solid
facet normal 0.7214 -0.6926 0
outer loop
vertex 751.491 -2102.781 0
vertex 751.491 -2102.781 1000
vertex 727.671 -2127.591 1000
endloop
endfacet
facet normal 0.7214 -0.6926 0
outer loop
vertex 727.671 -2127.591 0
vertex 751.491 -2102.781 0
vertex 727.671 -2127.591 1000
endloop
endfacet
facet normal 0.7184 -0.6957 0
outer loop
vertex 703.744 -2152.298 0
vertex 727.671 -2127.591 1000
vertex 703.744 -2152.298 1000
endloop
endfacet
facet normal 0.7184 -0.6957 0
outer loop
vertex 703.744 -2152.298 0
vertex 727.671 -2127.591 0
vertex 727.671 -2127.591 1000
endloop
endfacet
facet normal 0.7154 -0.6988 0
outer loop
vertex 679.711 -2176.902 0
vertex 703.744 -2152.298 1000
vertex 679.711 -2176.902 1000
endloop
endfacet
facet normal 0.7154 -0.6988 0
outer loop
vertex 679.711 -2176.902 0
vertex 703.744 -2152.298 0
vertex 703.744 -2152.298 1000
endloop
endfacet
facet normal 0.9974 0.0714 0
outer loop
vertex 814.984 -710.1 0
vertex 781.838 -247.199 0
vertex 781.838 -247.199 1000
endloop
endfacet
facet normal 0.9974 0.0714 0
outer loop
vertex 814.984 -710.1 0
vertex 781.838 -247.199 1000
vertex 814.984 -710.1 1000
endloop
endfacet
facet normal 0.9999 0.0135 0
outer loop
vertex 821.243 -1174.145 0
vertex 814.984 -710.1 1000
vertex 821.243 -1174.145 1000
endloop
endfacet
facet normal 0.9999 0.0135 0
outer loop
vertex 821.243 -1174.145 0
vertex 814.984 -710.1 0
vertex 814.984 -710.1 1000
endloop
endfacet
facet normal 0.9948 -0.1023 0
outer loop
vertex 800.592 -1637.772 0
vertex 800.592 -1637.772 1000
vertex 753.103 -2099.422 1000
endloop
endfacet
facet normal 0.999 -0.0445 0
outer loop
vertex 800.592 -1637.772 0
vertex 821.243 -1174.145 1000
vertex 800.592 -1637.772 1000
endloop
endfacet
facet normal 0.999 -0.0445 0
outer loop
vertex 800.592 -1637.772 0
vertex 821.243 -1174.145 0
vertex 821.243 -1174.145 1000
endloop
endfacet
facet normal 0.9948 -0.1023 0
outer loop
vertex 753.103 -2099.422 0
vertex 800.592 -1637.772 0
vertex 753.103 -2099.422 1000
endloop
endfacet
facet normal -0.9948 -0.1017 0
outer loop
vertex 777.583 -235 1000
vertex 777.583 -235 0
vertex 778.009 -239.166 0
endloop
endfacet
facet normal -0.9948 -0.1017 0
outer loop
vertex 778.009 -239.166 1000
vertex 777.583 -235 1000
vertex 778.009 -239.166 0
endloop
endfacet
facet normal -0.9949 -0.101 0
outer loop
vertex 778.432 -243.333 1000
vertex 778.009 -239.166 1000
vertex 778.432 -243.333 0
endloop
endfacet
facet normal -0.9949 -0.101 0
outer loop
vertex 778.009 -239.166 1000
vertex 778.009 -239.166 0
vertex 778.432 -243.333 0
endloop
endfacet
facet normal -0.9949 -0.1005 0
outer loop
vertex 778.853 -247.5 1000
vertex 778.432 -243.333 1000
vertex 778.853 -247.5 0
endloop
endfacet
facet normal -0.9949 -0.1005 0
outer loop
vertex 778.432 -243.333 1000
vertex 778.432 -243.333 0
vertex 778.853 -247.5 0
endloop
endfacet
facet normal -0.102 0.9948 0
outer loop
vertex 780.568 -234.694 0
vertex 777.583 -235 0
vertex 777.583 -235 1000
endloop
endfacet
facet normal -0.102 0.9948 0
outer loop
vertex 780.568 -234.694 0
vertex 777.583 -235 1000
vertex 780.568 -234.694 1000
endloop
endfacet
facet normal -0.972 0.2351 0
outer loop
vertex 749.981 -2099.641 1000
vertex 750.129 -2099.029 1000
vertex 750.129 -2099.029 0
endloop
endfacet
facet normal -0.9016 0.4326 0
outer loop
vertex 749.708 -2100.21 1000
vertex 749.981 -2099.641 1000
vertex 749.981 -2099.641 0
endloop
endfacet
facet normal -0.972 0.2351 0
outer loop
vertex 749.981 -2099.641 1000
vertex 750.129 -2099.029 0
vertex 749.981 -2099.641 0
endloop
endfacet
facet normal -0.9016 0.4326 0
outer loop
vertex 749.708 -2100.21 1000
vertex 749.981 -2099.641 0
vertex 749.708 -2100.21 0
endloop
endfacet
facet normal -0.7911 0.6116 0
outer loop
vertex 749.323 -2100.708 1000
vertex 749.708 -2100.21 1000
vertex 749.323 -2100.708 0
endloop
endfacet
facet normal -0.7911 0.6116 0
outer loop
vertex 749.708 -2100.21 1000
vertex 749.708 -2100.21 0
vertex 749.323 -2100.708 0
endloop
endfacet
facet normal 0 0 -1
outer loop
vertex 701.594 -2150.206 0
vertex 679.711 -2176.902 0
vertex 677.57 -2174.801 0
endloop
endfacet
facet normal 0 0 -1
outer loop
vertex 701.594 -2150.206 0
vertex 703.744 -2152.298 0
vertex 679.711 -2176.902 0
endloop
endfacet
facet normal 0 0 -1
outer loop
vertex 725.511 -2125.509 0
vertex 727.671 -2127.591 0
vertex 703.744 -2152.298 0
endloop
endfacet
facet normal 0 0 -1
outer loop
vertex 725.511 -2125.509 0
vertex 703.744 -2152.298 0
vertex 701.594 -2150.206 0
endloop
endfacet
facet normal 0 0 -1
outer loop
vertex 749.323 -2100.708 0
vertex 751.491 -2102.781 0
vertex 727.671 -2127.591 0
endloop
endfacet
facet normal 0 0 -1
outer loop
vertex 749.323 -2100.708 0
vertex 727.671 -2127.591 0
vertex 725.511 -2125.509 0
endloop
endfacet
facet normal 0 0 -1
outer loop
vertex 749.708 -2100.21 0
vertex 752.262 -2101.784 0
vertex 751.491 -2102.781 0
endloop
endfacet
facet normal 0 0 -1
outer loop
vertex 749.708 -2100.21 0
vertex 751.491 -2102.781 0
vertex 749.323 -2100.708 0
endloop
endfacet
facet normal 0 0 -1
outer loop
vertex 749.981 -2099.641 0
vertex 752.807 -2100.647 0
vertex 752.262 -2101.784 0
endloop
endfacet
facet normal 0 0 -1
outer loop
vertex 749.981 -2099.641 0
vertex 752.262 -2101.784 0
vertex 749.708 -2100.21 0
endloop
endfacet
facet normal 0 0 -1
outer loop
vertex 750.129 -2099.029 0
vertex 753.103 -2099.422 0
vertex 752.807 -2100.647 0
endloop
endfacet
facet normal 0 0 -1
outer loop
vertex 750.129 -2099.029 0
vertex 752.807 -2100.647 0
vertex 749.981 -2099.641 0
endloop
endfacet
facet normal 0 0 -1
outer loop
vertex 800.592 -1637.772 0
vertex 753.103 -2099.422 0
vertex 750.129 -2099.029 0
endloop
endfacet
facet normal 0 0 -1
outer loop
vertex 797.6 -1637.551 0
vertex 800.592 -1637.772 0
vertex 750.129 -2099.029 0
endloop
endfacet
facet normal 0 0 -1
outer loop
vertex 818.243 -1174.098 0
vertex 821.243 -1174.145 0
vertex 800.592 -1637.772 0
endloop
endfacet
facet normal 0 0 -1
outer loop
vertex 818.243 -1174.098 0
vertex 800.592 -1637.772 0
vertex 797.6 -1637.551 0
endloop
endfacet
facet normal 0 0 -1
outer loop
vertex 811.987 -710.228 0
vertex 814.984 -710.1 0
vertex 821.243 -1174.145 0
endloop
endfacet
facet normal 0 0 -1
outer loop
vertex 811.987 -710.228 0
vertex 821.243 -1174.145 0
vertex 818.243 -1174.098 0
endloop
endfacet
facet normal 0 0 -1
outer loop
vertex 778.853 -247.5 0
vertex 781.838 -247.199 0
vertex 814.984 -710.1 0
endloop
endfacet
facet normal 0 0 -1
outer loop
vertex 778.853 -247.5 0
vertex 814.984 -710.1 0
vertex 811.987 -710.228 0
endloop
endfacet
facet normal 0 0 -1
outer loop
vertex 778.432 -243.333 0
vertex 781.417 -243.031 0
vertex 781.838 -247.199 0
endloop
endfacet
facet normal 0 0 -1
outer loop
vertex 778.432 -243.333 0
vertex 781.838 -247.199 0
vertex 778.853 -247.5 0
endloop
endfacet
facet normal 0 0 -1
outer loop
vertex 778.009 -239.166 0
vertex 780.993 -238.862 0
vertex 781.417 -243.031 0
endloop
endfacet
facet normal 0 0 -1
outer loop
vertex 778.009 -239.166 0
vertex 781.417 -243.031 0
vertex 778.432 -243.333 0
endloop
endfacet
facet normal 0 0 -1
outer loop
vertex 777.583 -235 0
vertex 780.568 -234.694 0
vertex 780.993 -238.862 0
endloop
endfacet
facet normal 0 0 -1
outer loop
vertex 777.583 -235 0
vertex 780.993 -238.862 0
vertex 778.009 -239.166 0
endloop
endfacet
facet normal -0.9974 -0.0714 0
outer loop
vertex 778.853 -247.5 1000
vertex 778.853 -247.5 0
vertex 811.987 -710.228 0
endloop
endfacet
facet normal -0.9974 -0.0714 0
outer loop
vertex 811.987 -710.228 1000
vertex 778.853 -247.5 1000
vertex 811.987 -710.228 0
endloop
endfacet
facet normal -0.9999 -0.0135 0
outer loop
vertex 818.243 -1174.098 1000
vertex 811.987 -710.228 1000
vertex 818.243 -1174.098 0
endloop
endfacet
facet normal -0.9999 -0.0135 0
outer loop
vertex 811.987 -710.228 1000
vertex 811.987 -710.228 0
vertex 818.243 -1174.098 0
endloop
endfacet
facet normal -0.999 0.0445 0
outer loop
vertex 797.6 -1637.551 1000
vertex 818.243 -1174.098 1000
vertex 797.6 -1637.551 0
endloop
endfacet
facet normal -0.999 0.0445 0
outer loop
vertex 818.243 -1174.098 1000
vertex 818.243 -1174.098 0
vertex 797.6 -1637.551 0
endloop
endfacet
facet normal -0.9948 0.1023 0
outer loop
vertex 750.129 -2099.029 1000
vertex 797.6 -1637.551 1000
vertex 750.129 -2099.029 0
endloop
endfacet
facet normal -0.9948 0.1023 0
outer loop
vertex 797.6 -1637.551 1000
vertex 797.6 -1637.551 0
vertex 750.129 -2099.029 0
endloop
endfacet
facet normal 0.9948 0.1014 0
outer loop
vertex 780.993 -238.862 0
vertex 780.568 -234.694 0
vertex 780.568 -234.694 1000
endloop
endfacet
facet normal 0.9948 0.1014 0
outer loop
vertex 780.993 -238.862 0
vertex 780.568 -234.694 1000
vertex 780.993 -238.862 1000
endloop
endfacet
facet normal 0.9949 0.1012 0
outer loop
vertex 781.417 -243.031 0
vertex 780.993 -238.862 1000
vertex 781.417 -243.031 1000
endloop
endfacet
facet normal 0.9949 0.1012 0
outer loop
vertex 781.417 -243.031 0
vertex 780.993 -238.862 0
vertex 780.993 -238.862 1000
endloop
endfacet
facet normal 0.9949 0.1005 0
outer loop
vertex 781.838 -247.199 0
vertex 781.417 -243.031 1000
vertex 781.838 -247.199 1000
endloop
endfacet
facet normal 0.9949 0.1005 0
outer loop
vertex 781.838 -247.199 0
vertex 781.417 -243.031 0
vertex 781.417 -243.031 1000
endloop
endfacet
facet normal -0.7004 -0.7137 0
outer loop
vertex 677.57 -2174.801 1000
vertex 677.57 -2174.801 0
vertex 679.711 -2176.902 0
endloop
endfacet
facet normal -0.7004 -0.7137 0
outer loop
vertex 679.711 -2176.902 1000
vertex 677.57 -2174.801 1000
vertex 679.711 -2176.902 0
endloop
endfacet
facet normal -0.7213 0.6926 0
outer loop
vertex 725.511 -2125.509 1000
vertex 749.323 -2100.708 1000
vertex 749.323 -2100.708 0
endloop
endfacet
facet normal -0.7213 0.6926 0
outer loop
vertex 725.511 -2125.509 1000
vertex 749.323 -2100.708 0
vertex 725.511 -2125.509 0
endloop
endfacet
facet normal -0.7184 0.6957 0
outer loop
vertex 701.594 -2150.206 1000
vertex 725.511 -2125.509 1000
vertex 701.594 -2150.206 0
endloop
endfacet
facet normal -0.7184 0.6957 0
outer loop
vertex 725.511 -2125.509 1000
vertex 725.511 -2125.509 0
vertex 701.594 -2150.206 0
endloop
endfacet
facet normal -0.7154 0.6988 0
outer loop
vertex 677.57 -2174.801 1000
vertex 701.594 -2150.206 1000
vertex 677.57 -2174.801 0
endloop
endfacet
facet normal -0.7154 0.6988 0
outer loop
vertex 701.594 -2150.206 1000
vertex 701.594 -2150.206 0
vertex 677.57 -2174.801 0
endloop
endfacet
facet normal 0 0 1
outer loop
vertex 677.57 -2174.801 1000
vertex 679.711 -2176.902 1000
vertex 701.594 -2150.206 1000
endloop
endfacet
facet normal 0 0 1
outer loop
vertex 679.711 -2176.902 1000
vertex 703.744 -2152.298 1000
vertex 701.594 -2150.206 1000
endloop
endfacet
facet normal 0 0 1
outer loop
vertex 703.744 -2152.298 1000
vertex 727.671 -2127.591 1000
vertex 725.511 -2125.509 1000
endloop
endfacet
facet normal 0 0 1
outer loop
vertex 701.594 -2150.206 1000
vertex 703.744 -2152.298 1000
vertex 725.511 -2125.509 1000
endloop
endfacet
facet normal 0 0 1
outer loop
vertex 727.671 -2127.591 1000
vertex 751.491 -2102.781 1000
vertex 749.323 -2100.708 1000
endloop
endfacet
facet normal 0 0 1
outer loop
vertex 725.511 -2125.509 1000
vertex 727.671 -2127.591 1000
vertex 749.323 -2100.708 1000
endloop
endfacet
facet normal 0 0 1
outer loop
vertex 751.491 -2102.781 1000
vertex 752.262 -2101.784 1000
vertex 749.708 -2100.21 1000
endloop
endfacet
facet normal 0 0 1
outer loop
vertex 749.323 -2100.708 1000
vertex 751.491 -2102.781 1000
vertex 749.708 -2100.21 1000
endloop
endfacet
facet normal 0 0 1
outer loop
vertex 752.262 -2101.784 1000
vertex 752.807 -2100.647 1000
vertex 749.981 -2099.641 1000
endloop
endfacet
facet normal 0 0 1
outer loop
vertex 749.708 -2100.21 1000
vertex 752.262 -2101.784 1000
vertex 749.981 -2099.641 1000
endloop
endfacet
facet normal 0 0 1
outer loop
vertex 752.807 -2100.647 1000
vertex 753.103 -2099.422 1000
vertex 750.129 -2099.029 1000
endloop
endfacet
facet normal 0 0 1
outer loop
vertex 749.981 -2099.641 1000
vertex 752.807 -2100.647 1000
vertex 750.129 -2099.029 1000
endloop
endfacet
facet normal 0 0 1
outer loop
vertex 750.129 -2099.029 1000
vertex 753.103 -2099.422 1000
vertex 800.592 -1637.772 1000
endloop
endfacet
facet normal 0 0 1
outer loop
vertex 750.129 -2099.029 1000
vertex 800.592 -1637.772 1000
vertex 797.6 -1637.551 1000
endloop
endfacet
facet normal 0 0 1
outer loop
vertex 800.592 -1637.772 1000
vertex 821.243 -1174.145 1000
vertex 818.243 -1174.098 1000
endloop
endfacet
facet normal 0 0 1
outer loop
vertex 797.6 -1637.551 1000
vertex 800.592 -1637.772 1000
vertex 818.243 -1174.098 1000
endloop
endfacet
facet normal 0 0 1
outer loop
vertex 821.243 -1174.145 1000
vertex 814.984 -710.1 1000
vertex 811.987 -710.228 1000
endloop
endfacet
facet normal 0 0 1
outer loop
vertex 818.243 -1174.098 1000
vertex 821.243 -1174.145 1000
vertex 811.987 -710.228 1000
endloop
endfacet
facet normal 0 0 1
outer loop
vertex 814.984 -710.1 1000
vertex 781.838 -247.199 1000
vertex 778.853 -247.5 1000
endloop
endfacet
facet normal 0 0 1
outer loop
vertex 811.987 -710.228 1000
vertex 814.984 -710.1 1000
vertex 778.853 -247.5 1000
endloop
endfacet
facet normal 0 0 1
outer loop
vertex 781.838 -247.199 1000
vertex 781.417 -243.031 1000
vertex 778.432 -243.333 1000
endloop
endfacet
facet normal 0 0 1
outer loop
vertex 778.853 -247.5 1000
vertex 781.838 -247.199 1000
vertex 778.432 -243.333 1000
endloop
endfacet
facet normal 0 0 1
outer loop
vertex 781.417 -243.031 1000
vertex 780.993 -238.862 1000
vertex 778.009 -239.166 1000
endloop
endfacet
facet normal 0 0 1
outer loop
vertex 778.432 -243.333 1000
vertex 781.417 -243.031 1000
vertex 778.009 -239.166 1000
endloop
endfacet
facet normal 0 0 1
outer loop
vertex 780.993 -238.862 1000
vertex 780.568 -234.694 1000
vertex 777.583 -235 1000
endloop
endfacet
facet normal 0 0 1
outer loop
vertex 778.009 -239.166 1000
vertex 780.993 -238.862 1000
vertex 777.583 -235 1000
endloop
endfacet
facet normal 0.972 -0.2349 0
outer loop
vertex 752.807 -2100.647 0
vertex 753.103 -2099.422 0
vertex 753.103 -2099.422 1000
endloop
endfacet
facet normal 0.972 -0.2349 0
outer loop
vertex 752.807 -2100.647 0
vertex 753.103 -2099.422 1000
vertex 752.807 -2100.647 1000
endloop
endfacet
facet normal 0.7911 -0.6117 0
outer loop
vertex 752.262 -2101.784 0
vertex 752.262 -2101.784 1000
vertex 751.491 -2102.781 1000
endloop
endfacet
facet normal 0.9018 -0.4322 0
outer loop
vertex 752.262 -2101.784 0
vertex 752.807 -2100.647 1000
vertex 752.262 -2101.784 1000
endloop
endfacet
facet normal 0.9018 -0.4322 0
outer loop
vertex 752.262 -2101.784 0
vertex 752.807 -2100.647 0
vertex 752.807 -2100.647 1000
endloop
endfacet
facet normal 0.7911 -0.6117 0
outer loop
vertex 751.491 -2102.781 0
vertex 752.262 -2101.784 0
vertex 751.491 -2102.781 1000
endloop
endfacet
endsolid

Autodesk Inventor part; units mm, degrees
ref_plane "YZ Plane" through (0, 0, 0) normal (1, 0, 0) x (0, 1, 0)
ref_plane "XZ Plane" through (0, 0, 0) normal (0, 1, 0) x (-1, 0, 0)
ref_plane "XY Plane" through (0, 0, 0) normal (0, 0, 1) x (1, 0, 0)
sketch "Sketch1" plane through (0, 0, 0) normal (0, 0, 1) x (1, 0, 0)
  line L0 (-750, 0) -> (750, 0) construction
  line L1 (750, 0) -> (750, -2100) construction
  line L2 (750, -2100) -> (110, -2700) construction
  line L3 (108.907697, -2700) -> (-108.907697, -2700) construction
  line L4 (-110, -2700) -> (-750, -2100) construction
  line L5 (-750, -2100) -> (-750, 0) construction
  arc A0 (745.236855, 0.447083) -> (-745.236855, 0.447083) centre (0, -7964.766161) ccw construction
  arc A1 (-750.626493, -4.742884) -> (-776.293231, -222.5) centre (7180.794412, -1050) ccw construction
  arc A2 (-777.58325, -235) -> (-778.853429, -247.5) centre (7180.794412, -1050) ccw construction
  arc A3 (750.128547, -2099.028611) -> (778.853429, -247.5) centre (-7180.794412, -1050) ccw
  arc A4 (777.58325, -235) -> (776.293231, -222.5) centre (-7180.794412, -1050) ccw construction
  line L6 (-777.58325, -235) -> (777.58325, -235) construction
  arc A5 (-749.322934, -2100.70831) -> (-677.569881, -2174.801078) centre (5033.298449, 3427.518345) ccw construction
  line L7 (-750, -2100) -> (750, -2100) construction
  line L8 (-547.172872, -2035.710935) -> (-801.083389, -2306.54882) construction
  arc A6 (-677.569881, -2174.801078) -> (-110.836747, -2699.297556) centre (5033.298449, 3427.518345) ccw construction
  arc A7 (-745.236855, 0.447083) -> (-750.626493, -4.742884) centre (-744.677927, -5.526826) ccw construction
  arc A8 (750.626493, -4.742884) -> (745.236855, 0.447083) centre (744.677927, -5.526826) ccw construction
  arc A9 (-750.128547, -2099.028611) -> (-749.322934, -2100.70831) centre (-747.154451, -2098.635225) ccw construction
  arc A10 (110.836747, -2699.297556) -> (677.569881, -2174.801078) centre (-5033.298449, 3427.518345) ccw construction
  line L9 (553.81945, -2042.800618) -> (794.436811, -2299.459137) construction
  arc A11 (677.569881, -2174.801078) -> (749.322934, -2100.70831) centre (-5033.298449, 3427.518345) ccw
  arc A12 (749.322934, -2100.70831) -> (750.128547, -2099.028611) centre (747.154451, -2098.635225) ccw
  arc A13 (-110.836747, -2699.297556) -> (-108.907697, -2700) centre (-108.907697, -2697) ccw construction
  arc A14 (108.907697, -2700) -> (110.836747, -2699.297556) centre (108.907697, -2697) ccw construction
  line L10 (776.293231, -222.5) -> (-776.293231, -222.5) construction
  line L11 (778.853429, -247.5) -> (-778.853429, -247.5) construction
  arc A15 (778.853429, -247.5) -> (777.58325, -235) centre (-7180.794412, -1050) ccw
  arc A16 (776.293231, -222.5) -> (750.626493, -4.742884) centre (-7180.794412, -1050) ccw construction
  arc A17 (-776.293231, -222.5) -> (-777.58325, -235) centre (7180.794412, -1050) ccw construction
  arc A18 (-778.853429, -247.5) -> (-750.128547, -2099.028611) centre (7180.794412, -1050) ccw construction
  point P0 (0, 0)
  point P1 (0, 0)
  point P2 (0, 0)
  point P3 (0, -2700)
  point P4 (-674.128131, -2171.129877)
  point P5 (674.128131, -2171.129877)
  dimension "d43" = 1500
  dimension "d44" = 2100
  dimension "d45" = 220
  dimension "d46" = 2700
  dimension "d47" = 8000
  dimension "d48" = 8000
  dimension "d49" = 8000
  dimension "d50" = 235
  dimension "d51" = 8000
  dimension "d52" = 104
  dimension "d53" = 6
  dimension "d54" = 3
  dimension "d55" = 8000
  dimension "d56" = 104
  dimension "d57" = 3
  dimension "d67" = 12.5
  dimension "d68" = 12.5
contour flange "Contour Flange1" sketch "Sketch1" thickness 3 bend radius 3 width 1000 along (0, 0, 1) mid plane no both sides no wall seen from (713.565816, -2137.870332, 0) lies toward (0.718358, -0.6956736, 0) curves A11 A12 A3 A15
bend "Bend1"
corner "Corner1"
equation "\"d43\" = Бак_ширина_общая"
equation "\"d44\" = Бак_высота_до_конуса"
equation "\"d45\" = Бак_брюхо_ширина_полки"
equation "\"d46\" = Бак_высота_общая"
equation "\"d47\" = Бак_радиус_стенок_общий"
equation "\"d48\" = Бак_радиус_стенок_общий"
equation "\"d49\" = Бак_радиус_стенок_общий"
equation "\"d50\" = Бак_спина_длина_фланцев"
equation "\"d51\" = Бак_радиус_стенок_общий"
equation "\"d52\" = Бак_борт_длина_фланца"
equation "\"d53\" = d65 + d66"
equation "\"d54\" = Thickness"
equation "\"d55\" = Бак_радиус_стенок_общий"
equation "\"d56\" = Бак_борт_длина_фланца"
equation "\"d67\" = Бак_нахлест_фланца"
equation "\"d68\" = Бак_нахлест_фланца"
equation "\"d8\" = Thickness"
equation "\"d9\" = BendReliefWidth"
equation "\"d10\" = BendReliefDepth"
equation "\"d11\" = MinimumRemnant"
equation "\"d12\" = TransitionRadius"
equation "\"d14\" = BendRadius"
equation "\"d16\" = CornerReliefSize"
equation "\"d17\" = GapSize"
equation "\"d18\" = JacobiRadiusSize"
equation "\"BendRadius\" = Thickness"
equation "\"BendReliefWidth\" = Thickness"
equation "\"BendReliefDepth\" = 0.5 * Thickness"
equation "\"CornerReliefSize\" = 4 * Thickness"
equation "\"MinimumRemnant\" = 2 * Thickness"
equation "\"TransitionRadius\" = BendRadius"
equation "\"JacobiRadiusSize\" = BendRadius"
equation "\"GapSize\" = Thickness"
equation "\"d66\" = d65"
equation "\"Бак_ширина_общая\" = 1500"
equation "\"Бак_высота_до_конуса\" = 2100"
equation "\"Бак_брюхо_ширина_полки\" = 220"
equation "\"Бак_радиус_стенок_общий\" = 8000"
equation "\"Бак_спина_длина_фланцев\" = 235"
equation "\"d65\" = 3"
equation "\"Thickness\" = 3"
equation "\"Бак_нахлест_фланца\" = 12.5"
equation "\"Бак_высота_общая\" = 2700"
equation "\"Бак_борт_длина_фланца\" = 104"
properties part number "МОО 020 лист борт 1"
